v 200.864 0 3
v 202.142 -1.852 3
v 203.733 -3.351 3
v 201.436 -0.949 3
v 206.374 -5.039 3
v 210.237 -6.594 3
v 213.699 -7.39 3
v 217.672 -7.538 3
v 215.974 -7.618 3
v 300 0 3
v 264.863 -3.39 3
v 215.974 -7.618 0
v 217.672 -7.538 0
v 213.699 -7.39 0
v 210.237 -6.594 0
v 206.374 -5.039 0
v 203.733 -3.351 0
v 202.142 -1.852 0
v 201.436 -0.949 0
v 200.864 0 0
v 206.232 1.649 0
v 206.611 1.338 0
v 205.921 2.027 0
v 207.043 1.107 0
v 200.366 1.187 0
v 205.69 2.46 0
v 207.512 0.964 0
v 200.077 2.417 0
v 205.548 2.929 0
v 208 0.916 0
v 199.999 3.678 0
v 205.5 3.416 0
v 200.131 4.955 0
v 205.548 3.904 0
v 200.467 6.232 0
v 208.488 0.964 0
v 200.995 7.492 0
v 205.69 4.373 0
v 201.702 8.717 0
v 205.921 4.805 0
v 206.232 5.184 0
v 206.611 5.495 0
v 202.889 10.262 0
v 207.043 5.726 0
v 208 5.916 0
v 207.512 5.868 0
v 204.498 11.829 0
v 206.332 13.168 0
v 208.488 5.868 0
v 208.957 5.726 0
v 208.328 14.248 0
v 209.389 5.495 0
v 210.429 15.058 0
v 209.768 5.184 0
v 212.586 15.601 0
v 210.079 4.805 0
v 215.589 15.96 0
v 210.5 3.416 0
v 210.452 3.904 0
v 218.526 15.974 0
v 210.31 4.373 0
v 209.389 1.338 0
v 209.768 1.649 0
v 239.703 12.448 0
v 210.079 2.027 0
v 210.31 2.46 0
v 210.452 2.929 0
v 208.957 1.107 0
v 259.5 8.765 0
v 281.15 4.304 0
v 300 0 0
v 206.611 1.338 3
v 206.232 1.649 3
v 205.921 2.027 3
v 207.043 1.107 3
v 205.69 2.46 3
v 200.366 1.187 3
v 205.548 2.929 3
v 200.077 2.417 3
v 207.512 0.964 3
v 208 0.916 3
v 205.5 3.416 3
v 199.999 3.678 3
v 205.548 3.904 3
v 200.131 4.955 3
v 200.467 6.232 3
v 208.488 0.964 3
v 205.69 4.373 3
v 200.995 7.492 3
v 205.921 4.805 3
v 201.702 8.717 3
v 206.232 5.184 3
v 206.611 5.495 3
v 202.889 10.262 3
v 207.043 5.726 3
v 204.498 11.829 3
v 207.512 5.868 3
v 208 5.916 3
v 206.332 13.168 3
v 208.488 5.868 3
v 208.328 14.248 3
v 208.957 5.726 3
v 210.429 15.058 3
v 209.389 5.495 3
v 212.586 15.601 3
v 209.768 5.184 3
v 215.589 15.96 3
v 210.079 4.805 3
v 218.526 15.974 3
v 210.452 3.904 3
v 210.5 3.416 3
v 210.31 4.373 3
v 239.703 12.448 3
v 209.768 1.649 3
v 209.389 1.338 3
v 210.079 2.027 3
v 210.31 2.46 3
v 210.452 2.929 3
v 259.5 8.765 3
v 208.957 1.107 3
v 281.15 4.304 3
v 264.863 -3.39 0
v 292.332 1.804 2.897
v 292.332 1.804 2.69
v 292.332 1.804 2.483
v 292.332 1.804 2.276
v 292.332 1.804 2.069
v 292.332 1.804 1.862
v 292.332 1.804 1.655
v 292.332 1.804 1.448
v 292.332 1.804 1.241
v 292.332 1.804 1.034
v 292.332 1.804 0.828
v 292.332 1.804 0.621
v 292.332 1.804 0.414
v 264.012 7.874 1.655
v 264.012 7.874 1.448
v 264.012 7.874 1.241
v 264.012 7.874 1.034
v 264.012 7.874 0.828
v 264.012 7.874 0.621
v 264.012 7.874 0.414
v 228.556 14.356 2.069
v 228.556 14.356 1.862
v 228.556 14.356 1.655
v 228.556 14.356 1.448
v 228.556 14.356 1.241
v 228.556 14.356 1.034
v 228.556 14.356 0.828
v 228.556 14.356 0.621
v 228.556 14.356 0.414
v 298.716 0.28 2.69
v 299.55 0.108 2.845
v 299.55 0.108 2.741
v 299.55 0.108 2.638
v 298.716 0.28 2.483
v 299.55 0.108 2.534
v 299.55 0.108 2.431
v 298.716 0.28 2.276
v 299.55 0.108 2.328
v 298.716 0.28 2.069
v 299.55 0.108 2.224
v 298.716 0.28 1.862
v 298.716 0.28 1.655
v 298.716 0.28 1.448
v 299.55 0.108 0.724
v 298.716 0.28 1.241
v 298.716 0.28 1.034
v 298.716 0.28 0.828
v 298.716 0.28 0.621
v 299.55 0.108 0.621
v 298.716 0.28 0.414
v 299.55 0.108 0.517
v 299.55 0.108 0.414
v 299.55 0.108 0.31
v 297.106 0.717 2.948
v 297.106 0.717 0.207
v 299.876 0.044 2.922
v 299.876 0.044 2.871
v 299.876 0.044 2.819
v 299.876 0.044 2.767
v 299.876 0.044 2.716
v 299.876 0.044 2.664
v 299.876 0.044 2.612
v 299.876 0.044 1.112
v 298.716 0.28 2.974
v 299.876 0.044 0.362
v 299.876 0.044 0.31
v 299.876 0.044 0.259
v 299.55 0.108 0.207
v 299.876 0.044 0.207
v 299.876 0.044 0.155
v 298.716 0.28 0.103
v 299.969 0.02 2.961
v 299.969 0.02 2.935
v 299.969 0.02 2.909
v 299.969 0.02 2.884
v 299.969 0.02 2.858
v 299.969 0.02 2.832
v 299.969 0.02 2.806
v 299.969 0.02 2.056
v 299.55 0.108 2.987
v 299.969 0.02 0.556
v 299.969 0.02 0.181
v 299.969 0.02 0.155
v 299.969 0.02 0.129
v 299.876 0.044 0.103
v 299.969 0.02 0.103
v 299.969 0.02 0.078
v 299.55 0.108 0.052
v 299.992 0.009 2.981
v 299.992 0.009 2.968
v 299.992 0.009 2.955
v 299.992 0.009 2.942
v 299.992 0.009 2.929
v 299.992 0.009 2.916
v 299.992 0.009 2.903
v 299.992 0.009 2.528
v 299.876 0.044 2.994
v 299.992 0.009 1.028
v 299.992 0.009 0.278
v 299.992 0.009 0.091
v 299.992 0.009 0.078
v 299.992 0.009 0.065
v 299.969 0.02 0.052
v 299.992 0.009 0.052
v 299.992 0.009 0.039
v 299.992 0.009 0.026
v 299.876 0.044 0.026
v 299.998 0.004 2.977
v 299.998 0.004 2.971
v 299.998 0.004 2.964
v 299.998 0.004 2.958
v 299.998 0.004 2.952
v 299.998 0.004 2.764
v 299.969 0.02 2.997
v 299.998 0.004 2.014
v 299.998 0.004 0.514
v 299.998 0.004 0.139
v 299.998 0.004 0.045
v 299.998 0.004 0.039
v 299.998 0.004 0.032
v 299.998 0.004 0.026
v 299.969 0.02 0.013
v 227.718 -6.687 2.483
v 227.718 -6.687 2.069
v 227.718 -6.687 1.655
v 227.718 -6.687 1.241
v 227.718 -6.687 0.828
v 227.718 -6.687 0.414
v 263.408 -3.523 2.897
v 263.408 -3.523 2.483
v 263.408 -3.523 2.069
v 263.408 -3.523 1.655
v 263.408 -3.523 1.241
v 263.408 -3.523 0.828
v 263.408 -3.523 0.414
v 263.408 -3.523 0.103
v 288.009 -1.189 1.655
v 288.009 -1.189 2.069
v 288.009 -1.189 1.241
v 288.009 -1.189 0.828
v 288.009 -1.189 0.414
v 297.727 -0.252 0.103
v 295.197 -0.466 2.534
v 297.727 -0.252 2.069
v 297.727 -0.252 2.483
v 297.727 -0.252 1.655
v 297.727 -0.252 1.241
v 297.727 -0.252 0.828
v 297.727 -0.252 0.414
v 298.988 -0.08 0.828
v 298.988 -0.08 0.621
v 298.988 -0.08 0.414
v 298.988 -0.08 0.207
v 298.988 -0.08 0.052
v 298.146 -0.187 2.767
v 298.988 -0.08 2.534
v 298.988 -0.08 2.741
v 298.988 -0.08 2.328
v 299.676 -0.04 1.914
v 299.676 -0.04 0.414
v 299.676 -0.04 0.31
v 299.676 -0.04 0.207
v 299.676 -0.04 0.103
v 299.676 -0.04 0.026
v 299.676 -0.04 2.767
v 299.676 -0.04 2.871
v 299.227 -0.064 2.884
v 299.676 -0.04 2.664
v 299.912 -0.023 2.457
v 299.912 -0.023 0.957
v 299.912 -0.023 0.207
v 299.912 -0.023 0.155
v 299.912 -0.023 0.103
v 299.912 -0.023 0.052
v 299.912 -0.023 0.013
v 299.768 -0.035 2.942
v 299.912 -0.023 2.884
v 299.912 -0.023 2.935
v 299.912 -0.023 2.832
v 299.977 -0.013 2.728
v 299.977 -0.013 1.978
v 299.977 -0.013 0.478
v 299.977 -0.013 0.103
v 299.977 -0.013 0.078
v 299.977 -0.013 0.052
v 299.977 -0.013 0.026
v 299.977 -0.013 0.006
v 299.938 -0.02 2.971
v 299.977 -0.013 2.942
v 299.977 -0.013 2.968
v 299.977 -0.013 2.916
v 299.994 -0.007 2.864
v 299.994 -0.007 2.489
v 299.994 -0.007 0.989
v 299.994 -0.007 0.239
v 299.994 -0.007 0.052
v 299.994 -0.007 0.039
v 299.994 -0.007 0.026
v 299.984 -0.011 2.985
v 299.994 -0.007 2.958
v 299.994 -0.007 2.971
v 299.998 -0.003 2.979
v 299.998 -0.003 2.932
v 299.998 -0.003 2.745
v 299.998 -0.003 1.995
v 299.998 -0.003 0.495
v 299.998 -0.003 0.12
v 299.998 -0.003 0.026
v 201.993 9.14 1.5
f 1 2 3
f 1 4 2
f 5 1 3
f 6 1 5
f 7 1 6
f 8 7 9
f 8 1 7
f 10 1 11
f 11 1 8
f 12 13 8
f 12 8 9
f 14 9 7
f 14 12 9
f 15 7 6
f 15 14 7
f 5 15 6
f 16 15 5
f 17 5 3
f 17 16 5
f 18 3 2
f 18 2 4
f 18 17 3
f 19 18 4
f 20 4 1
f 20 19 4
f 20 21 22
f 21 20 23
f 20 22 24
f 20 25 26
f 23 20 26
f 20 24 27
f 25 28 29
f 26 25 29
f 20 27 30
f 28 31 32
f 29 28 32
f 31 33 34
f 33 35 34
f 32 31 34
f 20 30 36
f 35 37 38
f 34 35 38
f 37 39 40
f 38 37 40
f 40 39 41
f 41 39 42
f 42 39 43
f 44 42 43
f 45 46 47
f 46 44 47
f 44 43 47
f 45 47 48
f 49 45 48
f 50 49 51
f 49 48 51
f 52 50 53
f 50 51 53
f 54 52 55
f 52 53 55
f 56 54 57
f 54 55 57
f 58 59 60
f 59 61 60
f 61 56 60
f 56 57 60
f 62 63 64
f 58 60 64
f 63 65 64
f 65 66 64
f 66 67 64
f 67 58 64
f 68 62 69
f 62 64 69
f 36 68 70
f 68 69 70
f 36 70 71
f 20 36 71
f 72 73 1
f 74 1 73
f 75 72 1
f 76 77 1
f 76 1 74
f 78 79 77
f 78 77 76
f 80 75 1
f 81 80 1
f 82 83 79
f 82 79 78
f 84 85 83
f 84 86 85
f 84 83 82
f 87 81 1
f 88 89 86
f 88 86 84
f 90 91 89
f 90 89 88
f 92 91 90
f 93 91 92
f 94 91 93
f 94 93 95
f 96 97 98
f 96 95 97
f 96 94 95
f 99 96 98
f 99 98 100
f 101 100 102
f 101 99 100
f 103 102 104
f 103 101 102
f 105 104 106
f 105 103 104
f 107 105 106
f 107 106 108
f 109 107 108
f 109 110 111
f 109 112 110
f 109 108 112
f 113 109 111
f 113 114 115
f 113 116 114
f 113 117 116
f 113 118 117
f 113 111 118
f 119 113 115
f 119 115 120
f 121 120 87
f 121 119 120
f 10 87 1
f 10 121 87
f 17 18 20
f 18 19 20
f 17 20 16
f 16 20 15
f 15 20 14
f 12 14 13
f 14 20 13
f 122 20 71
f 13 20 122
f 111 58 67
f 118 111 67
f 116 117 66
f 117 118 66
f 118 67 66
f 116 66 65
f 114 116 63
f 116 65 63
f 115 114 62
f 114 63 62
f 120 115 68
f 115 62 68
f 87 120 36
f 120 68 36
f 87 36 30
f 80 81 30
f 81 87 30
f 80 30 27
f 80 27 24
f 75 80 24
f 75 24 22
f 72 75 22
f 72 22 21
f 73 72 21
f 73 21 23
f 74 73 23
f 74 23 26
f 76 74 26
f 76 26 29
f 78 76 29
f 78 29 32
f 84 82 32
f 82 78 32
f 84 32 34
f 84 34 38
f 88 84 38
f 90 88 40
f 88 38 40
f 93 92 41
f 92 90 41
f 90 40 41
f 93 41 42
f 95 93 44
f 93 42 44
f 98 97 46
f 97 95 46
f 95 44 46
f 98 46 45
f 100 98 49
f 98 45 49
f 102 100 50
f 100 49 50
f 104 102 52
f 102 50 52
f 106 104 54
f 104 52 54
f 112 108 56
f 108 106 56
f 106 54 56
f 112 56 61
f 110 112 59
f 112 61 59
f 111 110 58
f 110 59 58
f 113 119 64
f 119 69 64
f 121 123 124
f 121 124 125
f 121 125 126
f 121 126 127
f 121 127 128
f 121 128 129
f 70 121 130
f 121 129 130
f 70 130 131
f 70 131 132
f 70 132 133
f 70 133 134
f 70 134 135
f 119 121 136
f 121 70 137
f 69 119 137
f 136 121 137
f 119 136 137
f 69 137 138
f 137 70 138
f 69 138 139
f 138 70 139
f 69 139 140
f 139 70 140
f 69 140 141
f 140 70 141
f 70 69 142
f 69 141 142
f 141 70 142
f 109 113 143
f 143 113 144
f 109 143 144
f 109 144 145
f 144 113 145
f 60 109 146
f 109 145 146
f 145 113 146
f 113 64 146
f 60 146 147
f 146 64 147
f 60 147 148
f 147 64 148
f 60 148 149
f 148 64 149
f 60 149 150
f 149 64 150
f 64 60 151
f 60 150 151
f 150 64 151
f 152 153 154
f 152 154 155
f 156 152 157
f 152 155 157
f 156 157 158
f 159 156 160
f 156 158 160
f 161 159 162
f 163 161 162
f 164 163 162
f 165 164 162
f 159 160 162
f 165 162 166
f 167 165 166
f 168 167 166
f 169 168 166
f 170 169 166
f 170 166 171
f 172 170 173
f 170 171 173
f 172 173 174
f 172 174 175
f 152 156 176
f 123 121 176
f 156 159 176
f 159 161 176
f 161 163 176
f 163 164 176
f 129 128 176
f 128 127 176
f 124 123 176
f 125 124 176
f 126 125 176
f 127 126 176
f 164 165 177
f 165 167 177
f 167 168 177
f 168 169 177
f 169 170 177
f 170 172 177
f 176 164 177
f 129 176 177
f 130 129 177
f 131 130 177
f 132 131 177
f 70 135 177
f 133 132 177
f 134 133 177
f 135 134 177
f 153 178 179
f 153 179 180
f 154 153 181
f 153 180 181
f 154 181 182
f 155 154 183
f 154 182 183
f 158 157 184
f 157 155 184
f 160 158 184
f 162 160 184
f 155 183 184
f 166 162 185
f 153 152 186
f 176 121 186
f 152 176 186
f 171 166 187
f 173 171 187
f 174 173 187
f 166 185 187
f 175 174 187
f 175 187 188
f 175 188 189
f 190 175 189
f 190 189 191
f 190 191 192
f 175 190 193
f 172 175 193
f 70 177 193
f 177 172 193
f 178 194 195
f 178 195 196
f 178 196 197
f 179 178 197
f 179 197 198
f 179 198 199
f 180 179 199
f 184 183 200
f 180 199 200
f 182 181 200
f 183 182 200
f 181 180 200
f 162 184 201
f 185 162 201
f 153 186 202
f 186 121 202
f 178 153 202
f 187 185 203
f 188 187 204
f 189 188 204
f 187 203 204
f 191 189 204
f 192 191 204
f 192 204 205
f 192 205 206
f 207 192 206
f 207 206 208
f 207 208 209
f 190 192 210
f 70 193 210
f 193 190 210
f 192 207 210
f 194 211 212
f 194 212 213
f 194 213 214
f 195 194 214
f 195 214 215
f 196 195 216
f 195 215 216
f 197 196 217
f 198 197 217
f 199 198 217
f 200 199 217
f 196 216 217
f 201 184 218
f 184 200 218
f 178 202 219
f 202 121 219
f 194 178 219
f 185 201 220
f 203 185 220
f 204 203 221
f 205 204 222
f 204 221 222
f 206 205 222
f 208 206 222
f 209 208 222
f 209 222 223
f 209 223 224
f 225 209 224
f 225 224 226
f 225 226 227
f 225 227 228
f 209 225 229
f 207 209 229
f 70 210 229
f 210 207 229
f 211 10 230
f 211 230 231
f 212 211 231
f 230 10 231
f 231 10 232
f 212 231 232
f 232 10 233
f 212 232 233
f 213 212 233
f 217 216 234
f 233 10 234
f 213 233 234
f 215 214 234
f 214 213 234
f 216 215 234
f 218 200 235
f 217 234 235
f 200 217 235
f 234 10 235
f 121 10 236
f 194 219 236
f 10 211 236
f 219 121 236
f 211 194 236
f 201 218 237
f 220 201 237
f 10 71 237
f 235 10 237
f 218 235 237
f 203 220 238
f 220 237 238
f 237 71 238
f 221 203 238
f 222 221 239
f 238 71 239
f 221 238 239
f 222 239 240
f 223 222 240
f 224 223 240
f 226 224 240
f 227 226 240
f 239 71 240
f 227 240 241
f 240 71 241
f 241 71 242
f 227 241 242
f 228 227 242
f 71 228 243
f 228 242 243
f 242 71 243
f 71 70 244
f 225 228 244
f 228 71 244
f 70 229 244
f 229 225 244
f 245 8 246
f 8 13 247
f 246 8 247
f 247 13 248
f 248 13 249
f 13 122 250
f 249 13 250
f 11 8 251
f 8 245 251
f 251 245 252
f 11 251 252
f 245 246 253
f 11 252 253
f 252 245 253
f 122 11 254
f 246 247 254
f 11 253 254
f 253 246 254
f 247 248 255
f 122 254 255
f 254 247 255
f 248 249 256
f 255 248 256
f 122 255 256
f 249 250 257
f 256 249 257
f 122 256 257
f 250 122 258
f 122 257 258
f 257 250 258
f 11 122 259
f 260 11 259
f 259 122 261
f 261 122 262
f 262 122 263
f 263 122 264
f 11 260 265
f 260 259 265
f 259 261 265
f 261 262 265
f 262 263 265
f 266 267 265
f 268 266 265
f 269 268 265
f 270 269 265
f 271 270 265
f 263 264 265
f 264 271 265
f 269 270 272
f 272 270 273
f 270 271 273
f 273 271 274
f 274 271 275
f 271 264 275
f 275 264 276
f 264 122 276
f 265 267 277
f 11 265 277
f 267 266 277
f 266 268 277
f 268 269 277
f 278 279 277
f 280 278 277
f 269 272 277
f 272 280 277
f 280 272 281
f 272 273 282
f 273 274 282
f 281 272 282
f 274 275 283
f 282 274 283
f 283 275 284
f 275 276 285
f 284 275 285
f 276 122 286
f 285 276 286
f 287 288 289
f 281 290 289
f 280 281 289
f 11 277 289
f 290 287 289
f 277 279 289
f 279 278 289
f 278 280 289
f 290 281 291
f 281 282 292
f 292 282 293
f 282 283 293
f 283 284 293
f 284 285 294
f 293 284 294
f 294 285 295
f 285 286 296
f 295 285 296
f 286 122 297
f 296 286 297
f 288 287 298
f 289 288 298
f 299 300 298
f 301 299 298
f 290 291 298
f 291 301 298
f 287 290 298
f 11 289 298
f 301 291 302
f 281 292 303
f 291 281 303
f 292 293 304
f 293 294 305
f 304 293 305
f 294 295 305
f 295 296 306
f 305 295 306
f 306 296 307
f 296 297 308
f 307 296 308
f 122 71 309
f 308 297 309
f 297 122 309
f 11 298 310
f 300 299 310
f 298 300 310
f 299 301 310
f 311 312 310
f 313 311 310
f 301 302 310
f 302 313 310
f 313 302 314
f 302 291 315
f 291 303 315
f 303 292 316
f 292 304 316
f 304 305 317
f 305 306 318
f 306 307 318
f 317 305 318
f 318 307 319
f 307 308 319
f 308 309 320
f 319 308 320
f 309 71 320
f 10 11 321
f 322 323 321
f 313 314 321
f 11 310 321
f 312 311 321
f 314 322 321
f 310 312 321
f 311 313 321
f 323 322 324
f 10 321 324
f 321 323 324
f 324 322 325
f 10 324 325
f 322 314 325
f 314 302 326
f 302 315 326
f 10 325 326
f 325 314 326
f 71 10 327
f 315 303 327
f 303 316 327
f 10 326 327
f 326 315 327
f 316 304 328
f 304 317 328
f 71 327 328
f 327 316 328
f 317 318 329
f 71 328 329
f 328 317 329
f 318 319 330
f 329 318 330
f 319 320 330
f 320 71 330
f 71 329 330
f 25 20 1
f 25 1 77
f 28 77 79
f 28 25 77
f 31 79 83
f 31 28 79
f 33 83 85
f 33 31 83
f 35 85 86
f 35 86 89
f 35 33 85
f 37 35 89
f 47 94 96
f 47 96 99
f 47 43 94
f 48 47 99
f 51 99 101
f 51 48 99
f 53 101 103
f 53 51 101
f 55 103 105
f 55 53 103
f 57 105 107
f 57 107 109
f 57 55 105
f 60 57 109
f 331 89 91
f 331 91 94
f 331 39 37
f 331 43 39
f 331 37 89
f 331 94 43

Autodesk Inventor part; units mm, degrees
ref_plane "YZ Plane" through (0, 0, 0) normal (1, 0, 0) x (0, 1, 0)
ref_plane "XZ Plane" through (0, 0, 0) normal (0, 1, 0) x (-1, 0, 0)
ref_plane "XY Plane" through (0, 0, 0) normal (0, 0, 1) x (1, 0, 0)
sketch "Sketch1" plane through (0, 0, 0) normal (0, 0, 1) x (1, 0, 0)
  spline S0 degree 5 poles (217.3654, -7.5638) (217.3859, -7.562) (219.4778, -7.3868) (223.5726, -7.0416) (229.5629, -6.5311) (237.2988, -5.8637) (246.5067, -5.0508) (255.1715, -4.2808) (263.0989, -3.5455) (270.5088, -2.8843) (276.8391, -2.2398) (282.9867, -1.7375) (287.2724, -1.1764) (292.3303, -0.9034) (294.139, -0.4203) (298.1203, -0.3746) (298.262, -0.0558) (299.6943, -0.05) (299.9984, -0.0244) (300, 0) (300.0016, 0.0244) (299.7036, 0.09) (298.2843, 0.2856) (298.1861, 0.6201) (294.2411, 1.1852) (292.5088, 1.8941) (287.5168, 2.8048) (283.3251, 3.8823) (277.2635, 5.114) (271.0288, 6.4738) (263.7046, 7.9415) (255.8588, 9.4927) (247.2609, 11.1039) (238.144, 12.7436) (230.4968, 14.0478) (224.5814, 15.0163) (220.5538, 15.6564) (218.5257, 15.9738) knots 0.848643 0.848643 0.848643 0.848643 0.848643 0.848643 0.848791 0.863714 0.878289 0.892459 0.906165 0.919343 0.931928 0.943844 0.955007 0.965319 0.974656 0.982848 0.989595 0.994445 1 1 1 1 1 1.005555 1.010406 1.017155 1.025351 1.034694 1.045016 1.056192 1.068127 1.080735 1.093944 1.107687 1.121902 1.13653 1.151213 1.151213 1.151213 1.151213 1.151213 1.151213
  line L0 (200, 103) -> (200, -97) construction
  line L1 (300, -103) -> (300, 103) construction
  line L2 (200, 3.7134) -> (300, 0) construction
  circle A0 centre (225, 2.7851) radius 2.5 construction
  line L3 (205.8741, -8.5266) -> (228.8566, -6.6009) construction
  arc A1 (208.1717, -8.3262) -> (226.5577, -6.7856) centre (-233.8691, 5377.8161) ccw construction
  line L4 (230.0222, 14.1744) -> (207.0292, 17.7732) construction
  arc A2 (227.7165, 14.4952) -> (209.3227, 17.3741) centre (49.5564, -1063.5951) ccw construction
  spline S1 degree 4 poles (217.6716, -7.5381) (213.6705, -8.2359) (189.5382, -3.5576) (201.4741, 15.1863) (214.1486, 16.1309) (218.5257, 15.9738) knots 0 0 0 0 0 0.508217 0.817556 0.817556 0.817556 0.817556 0.817556
  line L5 (212.7843, 16.1798) -> (224.2671, 15.7678) construction
  arc A3 (223.0904, 15.5928) -> (213.9454, 15.921) centre (216.7921, -32.3331) ccw construction
  circle A4 centre (208, 3.4163) radius 2.5
  line L6 (-341.1611, 0) -> (409.8826, 0) projected
  point P0 (299.5428, 0.1089)
  point P1 (298.1739, 0.4338)
  point P2 (295.9008, 0.9681)
  point P3 (292.7367, 1.7025)
  point P4 (288.6996, 2.6229)
  point P5 (283.8129, 3.7134)
  point P6 (278.1048, 4.9545)
  point P7 (271.6086, 6.3255)
  point P8 (264.3621, 7.8039)
  point P9 (256.4085, 9.3663)
  point P10 (247.7946, 10.9887)
  point P11 (238.572, 12.6468)
  point P12 (228.7959, 14.3166)
  point P13 (207.8235, 17.5944)
  point P14 (237.7638, -5.8185)
  point P15 (247.0398, -5.0019)
  point P16 (255.7236, -4.2234)
  point P17 (263.7597, -3.4905)
  point P18 (271.0965, -2.8098)
  point P19 (277.6872, -2.1882)
  point P20 (283.4889, -1.6323)
  point P21 (288.4641, -1.1487)
  point P22 (292.5804, -0.7434)
  point P23 (295.8102, -0.4221)
  point P24 (298.1328, -0.1887)
  point P25 (299.5323, -0.0474)
  point P26 (217.3654, -7.5638)
  point P27 (206.2647, 13.1249)
  point P28 (218.5257, 15.9738)
  dimension "d17" = 100
  dimension "d22" = 5
  dimension "d23" = 75
  dimension "d27" = 5
  dimension "d30" = 92
  dimension "d31" = 3.4163
extrude "Extrusion2" add sketch "Sketch1" along normal blind 3
sketch "Sketch8" plane through (0, 0, 3) normal (0, 0, 1) x (1, 0, 0)
  circle A0 centre (208, 3.4163) radius 2.5 projected
  point P0 (0, 0)
  point P1 (217.6716, -7.5381)
  point P2 (218.5257, 15.9738)
properties part number "5mm end rib aileron" material "Plywood, Finish"
